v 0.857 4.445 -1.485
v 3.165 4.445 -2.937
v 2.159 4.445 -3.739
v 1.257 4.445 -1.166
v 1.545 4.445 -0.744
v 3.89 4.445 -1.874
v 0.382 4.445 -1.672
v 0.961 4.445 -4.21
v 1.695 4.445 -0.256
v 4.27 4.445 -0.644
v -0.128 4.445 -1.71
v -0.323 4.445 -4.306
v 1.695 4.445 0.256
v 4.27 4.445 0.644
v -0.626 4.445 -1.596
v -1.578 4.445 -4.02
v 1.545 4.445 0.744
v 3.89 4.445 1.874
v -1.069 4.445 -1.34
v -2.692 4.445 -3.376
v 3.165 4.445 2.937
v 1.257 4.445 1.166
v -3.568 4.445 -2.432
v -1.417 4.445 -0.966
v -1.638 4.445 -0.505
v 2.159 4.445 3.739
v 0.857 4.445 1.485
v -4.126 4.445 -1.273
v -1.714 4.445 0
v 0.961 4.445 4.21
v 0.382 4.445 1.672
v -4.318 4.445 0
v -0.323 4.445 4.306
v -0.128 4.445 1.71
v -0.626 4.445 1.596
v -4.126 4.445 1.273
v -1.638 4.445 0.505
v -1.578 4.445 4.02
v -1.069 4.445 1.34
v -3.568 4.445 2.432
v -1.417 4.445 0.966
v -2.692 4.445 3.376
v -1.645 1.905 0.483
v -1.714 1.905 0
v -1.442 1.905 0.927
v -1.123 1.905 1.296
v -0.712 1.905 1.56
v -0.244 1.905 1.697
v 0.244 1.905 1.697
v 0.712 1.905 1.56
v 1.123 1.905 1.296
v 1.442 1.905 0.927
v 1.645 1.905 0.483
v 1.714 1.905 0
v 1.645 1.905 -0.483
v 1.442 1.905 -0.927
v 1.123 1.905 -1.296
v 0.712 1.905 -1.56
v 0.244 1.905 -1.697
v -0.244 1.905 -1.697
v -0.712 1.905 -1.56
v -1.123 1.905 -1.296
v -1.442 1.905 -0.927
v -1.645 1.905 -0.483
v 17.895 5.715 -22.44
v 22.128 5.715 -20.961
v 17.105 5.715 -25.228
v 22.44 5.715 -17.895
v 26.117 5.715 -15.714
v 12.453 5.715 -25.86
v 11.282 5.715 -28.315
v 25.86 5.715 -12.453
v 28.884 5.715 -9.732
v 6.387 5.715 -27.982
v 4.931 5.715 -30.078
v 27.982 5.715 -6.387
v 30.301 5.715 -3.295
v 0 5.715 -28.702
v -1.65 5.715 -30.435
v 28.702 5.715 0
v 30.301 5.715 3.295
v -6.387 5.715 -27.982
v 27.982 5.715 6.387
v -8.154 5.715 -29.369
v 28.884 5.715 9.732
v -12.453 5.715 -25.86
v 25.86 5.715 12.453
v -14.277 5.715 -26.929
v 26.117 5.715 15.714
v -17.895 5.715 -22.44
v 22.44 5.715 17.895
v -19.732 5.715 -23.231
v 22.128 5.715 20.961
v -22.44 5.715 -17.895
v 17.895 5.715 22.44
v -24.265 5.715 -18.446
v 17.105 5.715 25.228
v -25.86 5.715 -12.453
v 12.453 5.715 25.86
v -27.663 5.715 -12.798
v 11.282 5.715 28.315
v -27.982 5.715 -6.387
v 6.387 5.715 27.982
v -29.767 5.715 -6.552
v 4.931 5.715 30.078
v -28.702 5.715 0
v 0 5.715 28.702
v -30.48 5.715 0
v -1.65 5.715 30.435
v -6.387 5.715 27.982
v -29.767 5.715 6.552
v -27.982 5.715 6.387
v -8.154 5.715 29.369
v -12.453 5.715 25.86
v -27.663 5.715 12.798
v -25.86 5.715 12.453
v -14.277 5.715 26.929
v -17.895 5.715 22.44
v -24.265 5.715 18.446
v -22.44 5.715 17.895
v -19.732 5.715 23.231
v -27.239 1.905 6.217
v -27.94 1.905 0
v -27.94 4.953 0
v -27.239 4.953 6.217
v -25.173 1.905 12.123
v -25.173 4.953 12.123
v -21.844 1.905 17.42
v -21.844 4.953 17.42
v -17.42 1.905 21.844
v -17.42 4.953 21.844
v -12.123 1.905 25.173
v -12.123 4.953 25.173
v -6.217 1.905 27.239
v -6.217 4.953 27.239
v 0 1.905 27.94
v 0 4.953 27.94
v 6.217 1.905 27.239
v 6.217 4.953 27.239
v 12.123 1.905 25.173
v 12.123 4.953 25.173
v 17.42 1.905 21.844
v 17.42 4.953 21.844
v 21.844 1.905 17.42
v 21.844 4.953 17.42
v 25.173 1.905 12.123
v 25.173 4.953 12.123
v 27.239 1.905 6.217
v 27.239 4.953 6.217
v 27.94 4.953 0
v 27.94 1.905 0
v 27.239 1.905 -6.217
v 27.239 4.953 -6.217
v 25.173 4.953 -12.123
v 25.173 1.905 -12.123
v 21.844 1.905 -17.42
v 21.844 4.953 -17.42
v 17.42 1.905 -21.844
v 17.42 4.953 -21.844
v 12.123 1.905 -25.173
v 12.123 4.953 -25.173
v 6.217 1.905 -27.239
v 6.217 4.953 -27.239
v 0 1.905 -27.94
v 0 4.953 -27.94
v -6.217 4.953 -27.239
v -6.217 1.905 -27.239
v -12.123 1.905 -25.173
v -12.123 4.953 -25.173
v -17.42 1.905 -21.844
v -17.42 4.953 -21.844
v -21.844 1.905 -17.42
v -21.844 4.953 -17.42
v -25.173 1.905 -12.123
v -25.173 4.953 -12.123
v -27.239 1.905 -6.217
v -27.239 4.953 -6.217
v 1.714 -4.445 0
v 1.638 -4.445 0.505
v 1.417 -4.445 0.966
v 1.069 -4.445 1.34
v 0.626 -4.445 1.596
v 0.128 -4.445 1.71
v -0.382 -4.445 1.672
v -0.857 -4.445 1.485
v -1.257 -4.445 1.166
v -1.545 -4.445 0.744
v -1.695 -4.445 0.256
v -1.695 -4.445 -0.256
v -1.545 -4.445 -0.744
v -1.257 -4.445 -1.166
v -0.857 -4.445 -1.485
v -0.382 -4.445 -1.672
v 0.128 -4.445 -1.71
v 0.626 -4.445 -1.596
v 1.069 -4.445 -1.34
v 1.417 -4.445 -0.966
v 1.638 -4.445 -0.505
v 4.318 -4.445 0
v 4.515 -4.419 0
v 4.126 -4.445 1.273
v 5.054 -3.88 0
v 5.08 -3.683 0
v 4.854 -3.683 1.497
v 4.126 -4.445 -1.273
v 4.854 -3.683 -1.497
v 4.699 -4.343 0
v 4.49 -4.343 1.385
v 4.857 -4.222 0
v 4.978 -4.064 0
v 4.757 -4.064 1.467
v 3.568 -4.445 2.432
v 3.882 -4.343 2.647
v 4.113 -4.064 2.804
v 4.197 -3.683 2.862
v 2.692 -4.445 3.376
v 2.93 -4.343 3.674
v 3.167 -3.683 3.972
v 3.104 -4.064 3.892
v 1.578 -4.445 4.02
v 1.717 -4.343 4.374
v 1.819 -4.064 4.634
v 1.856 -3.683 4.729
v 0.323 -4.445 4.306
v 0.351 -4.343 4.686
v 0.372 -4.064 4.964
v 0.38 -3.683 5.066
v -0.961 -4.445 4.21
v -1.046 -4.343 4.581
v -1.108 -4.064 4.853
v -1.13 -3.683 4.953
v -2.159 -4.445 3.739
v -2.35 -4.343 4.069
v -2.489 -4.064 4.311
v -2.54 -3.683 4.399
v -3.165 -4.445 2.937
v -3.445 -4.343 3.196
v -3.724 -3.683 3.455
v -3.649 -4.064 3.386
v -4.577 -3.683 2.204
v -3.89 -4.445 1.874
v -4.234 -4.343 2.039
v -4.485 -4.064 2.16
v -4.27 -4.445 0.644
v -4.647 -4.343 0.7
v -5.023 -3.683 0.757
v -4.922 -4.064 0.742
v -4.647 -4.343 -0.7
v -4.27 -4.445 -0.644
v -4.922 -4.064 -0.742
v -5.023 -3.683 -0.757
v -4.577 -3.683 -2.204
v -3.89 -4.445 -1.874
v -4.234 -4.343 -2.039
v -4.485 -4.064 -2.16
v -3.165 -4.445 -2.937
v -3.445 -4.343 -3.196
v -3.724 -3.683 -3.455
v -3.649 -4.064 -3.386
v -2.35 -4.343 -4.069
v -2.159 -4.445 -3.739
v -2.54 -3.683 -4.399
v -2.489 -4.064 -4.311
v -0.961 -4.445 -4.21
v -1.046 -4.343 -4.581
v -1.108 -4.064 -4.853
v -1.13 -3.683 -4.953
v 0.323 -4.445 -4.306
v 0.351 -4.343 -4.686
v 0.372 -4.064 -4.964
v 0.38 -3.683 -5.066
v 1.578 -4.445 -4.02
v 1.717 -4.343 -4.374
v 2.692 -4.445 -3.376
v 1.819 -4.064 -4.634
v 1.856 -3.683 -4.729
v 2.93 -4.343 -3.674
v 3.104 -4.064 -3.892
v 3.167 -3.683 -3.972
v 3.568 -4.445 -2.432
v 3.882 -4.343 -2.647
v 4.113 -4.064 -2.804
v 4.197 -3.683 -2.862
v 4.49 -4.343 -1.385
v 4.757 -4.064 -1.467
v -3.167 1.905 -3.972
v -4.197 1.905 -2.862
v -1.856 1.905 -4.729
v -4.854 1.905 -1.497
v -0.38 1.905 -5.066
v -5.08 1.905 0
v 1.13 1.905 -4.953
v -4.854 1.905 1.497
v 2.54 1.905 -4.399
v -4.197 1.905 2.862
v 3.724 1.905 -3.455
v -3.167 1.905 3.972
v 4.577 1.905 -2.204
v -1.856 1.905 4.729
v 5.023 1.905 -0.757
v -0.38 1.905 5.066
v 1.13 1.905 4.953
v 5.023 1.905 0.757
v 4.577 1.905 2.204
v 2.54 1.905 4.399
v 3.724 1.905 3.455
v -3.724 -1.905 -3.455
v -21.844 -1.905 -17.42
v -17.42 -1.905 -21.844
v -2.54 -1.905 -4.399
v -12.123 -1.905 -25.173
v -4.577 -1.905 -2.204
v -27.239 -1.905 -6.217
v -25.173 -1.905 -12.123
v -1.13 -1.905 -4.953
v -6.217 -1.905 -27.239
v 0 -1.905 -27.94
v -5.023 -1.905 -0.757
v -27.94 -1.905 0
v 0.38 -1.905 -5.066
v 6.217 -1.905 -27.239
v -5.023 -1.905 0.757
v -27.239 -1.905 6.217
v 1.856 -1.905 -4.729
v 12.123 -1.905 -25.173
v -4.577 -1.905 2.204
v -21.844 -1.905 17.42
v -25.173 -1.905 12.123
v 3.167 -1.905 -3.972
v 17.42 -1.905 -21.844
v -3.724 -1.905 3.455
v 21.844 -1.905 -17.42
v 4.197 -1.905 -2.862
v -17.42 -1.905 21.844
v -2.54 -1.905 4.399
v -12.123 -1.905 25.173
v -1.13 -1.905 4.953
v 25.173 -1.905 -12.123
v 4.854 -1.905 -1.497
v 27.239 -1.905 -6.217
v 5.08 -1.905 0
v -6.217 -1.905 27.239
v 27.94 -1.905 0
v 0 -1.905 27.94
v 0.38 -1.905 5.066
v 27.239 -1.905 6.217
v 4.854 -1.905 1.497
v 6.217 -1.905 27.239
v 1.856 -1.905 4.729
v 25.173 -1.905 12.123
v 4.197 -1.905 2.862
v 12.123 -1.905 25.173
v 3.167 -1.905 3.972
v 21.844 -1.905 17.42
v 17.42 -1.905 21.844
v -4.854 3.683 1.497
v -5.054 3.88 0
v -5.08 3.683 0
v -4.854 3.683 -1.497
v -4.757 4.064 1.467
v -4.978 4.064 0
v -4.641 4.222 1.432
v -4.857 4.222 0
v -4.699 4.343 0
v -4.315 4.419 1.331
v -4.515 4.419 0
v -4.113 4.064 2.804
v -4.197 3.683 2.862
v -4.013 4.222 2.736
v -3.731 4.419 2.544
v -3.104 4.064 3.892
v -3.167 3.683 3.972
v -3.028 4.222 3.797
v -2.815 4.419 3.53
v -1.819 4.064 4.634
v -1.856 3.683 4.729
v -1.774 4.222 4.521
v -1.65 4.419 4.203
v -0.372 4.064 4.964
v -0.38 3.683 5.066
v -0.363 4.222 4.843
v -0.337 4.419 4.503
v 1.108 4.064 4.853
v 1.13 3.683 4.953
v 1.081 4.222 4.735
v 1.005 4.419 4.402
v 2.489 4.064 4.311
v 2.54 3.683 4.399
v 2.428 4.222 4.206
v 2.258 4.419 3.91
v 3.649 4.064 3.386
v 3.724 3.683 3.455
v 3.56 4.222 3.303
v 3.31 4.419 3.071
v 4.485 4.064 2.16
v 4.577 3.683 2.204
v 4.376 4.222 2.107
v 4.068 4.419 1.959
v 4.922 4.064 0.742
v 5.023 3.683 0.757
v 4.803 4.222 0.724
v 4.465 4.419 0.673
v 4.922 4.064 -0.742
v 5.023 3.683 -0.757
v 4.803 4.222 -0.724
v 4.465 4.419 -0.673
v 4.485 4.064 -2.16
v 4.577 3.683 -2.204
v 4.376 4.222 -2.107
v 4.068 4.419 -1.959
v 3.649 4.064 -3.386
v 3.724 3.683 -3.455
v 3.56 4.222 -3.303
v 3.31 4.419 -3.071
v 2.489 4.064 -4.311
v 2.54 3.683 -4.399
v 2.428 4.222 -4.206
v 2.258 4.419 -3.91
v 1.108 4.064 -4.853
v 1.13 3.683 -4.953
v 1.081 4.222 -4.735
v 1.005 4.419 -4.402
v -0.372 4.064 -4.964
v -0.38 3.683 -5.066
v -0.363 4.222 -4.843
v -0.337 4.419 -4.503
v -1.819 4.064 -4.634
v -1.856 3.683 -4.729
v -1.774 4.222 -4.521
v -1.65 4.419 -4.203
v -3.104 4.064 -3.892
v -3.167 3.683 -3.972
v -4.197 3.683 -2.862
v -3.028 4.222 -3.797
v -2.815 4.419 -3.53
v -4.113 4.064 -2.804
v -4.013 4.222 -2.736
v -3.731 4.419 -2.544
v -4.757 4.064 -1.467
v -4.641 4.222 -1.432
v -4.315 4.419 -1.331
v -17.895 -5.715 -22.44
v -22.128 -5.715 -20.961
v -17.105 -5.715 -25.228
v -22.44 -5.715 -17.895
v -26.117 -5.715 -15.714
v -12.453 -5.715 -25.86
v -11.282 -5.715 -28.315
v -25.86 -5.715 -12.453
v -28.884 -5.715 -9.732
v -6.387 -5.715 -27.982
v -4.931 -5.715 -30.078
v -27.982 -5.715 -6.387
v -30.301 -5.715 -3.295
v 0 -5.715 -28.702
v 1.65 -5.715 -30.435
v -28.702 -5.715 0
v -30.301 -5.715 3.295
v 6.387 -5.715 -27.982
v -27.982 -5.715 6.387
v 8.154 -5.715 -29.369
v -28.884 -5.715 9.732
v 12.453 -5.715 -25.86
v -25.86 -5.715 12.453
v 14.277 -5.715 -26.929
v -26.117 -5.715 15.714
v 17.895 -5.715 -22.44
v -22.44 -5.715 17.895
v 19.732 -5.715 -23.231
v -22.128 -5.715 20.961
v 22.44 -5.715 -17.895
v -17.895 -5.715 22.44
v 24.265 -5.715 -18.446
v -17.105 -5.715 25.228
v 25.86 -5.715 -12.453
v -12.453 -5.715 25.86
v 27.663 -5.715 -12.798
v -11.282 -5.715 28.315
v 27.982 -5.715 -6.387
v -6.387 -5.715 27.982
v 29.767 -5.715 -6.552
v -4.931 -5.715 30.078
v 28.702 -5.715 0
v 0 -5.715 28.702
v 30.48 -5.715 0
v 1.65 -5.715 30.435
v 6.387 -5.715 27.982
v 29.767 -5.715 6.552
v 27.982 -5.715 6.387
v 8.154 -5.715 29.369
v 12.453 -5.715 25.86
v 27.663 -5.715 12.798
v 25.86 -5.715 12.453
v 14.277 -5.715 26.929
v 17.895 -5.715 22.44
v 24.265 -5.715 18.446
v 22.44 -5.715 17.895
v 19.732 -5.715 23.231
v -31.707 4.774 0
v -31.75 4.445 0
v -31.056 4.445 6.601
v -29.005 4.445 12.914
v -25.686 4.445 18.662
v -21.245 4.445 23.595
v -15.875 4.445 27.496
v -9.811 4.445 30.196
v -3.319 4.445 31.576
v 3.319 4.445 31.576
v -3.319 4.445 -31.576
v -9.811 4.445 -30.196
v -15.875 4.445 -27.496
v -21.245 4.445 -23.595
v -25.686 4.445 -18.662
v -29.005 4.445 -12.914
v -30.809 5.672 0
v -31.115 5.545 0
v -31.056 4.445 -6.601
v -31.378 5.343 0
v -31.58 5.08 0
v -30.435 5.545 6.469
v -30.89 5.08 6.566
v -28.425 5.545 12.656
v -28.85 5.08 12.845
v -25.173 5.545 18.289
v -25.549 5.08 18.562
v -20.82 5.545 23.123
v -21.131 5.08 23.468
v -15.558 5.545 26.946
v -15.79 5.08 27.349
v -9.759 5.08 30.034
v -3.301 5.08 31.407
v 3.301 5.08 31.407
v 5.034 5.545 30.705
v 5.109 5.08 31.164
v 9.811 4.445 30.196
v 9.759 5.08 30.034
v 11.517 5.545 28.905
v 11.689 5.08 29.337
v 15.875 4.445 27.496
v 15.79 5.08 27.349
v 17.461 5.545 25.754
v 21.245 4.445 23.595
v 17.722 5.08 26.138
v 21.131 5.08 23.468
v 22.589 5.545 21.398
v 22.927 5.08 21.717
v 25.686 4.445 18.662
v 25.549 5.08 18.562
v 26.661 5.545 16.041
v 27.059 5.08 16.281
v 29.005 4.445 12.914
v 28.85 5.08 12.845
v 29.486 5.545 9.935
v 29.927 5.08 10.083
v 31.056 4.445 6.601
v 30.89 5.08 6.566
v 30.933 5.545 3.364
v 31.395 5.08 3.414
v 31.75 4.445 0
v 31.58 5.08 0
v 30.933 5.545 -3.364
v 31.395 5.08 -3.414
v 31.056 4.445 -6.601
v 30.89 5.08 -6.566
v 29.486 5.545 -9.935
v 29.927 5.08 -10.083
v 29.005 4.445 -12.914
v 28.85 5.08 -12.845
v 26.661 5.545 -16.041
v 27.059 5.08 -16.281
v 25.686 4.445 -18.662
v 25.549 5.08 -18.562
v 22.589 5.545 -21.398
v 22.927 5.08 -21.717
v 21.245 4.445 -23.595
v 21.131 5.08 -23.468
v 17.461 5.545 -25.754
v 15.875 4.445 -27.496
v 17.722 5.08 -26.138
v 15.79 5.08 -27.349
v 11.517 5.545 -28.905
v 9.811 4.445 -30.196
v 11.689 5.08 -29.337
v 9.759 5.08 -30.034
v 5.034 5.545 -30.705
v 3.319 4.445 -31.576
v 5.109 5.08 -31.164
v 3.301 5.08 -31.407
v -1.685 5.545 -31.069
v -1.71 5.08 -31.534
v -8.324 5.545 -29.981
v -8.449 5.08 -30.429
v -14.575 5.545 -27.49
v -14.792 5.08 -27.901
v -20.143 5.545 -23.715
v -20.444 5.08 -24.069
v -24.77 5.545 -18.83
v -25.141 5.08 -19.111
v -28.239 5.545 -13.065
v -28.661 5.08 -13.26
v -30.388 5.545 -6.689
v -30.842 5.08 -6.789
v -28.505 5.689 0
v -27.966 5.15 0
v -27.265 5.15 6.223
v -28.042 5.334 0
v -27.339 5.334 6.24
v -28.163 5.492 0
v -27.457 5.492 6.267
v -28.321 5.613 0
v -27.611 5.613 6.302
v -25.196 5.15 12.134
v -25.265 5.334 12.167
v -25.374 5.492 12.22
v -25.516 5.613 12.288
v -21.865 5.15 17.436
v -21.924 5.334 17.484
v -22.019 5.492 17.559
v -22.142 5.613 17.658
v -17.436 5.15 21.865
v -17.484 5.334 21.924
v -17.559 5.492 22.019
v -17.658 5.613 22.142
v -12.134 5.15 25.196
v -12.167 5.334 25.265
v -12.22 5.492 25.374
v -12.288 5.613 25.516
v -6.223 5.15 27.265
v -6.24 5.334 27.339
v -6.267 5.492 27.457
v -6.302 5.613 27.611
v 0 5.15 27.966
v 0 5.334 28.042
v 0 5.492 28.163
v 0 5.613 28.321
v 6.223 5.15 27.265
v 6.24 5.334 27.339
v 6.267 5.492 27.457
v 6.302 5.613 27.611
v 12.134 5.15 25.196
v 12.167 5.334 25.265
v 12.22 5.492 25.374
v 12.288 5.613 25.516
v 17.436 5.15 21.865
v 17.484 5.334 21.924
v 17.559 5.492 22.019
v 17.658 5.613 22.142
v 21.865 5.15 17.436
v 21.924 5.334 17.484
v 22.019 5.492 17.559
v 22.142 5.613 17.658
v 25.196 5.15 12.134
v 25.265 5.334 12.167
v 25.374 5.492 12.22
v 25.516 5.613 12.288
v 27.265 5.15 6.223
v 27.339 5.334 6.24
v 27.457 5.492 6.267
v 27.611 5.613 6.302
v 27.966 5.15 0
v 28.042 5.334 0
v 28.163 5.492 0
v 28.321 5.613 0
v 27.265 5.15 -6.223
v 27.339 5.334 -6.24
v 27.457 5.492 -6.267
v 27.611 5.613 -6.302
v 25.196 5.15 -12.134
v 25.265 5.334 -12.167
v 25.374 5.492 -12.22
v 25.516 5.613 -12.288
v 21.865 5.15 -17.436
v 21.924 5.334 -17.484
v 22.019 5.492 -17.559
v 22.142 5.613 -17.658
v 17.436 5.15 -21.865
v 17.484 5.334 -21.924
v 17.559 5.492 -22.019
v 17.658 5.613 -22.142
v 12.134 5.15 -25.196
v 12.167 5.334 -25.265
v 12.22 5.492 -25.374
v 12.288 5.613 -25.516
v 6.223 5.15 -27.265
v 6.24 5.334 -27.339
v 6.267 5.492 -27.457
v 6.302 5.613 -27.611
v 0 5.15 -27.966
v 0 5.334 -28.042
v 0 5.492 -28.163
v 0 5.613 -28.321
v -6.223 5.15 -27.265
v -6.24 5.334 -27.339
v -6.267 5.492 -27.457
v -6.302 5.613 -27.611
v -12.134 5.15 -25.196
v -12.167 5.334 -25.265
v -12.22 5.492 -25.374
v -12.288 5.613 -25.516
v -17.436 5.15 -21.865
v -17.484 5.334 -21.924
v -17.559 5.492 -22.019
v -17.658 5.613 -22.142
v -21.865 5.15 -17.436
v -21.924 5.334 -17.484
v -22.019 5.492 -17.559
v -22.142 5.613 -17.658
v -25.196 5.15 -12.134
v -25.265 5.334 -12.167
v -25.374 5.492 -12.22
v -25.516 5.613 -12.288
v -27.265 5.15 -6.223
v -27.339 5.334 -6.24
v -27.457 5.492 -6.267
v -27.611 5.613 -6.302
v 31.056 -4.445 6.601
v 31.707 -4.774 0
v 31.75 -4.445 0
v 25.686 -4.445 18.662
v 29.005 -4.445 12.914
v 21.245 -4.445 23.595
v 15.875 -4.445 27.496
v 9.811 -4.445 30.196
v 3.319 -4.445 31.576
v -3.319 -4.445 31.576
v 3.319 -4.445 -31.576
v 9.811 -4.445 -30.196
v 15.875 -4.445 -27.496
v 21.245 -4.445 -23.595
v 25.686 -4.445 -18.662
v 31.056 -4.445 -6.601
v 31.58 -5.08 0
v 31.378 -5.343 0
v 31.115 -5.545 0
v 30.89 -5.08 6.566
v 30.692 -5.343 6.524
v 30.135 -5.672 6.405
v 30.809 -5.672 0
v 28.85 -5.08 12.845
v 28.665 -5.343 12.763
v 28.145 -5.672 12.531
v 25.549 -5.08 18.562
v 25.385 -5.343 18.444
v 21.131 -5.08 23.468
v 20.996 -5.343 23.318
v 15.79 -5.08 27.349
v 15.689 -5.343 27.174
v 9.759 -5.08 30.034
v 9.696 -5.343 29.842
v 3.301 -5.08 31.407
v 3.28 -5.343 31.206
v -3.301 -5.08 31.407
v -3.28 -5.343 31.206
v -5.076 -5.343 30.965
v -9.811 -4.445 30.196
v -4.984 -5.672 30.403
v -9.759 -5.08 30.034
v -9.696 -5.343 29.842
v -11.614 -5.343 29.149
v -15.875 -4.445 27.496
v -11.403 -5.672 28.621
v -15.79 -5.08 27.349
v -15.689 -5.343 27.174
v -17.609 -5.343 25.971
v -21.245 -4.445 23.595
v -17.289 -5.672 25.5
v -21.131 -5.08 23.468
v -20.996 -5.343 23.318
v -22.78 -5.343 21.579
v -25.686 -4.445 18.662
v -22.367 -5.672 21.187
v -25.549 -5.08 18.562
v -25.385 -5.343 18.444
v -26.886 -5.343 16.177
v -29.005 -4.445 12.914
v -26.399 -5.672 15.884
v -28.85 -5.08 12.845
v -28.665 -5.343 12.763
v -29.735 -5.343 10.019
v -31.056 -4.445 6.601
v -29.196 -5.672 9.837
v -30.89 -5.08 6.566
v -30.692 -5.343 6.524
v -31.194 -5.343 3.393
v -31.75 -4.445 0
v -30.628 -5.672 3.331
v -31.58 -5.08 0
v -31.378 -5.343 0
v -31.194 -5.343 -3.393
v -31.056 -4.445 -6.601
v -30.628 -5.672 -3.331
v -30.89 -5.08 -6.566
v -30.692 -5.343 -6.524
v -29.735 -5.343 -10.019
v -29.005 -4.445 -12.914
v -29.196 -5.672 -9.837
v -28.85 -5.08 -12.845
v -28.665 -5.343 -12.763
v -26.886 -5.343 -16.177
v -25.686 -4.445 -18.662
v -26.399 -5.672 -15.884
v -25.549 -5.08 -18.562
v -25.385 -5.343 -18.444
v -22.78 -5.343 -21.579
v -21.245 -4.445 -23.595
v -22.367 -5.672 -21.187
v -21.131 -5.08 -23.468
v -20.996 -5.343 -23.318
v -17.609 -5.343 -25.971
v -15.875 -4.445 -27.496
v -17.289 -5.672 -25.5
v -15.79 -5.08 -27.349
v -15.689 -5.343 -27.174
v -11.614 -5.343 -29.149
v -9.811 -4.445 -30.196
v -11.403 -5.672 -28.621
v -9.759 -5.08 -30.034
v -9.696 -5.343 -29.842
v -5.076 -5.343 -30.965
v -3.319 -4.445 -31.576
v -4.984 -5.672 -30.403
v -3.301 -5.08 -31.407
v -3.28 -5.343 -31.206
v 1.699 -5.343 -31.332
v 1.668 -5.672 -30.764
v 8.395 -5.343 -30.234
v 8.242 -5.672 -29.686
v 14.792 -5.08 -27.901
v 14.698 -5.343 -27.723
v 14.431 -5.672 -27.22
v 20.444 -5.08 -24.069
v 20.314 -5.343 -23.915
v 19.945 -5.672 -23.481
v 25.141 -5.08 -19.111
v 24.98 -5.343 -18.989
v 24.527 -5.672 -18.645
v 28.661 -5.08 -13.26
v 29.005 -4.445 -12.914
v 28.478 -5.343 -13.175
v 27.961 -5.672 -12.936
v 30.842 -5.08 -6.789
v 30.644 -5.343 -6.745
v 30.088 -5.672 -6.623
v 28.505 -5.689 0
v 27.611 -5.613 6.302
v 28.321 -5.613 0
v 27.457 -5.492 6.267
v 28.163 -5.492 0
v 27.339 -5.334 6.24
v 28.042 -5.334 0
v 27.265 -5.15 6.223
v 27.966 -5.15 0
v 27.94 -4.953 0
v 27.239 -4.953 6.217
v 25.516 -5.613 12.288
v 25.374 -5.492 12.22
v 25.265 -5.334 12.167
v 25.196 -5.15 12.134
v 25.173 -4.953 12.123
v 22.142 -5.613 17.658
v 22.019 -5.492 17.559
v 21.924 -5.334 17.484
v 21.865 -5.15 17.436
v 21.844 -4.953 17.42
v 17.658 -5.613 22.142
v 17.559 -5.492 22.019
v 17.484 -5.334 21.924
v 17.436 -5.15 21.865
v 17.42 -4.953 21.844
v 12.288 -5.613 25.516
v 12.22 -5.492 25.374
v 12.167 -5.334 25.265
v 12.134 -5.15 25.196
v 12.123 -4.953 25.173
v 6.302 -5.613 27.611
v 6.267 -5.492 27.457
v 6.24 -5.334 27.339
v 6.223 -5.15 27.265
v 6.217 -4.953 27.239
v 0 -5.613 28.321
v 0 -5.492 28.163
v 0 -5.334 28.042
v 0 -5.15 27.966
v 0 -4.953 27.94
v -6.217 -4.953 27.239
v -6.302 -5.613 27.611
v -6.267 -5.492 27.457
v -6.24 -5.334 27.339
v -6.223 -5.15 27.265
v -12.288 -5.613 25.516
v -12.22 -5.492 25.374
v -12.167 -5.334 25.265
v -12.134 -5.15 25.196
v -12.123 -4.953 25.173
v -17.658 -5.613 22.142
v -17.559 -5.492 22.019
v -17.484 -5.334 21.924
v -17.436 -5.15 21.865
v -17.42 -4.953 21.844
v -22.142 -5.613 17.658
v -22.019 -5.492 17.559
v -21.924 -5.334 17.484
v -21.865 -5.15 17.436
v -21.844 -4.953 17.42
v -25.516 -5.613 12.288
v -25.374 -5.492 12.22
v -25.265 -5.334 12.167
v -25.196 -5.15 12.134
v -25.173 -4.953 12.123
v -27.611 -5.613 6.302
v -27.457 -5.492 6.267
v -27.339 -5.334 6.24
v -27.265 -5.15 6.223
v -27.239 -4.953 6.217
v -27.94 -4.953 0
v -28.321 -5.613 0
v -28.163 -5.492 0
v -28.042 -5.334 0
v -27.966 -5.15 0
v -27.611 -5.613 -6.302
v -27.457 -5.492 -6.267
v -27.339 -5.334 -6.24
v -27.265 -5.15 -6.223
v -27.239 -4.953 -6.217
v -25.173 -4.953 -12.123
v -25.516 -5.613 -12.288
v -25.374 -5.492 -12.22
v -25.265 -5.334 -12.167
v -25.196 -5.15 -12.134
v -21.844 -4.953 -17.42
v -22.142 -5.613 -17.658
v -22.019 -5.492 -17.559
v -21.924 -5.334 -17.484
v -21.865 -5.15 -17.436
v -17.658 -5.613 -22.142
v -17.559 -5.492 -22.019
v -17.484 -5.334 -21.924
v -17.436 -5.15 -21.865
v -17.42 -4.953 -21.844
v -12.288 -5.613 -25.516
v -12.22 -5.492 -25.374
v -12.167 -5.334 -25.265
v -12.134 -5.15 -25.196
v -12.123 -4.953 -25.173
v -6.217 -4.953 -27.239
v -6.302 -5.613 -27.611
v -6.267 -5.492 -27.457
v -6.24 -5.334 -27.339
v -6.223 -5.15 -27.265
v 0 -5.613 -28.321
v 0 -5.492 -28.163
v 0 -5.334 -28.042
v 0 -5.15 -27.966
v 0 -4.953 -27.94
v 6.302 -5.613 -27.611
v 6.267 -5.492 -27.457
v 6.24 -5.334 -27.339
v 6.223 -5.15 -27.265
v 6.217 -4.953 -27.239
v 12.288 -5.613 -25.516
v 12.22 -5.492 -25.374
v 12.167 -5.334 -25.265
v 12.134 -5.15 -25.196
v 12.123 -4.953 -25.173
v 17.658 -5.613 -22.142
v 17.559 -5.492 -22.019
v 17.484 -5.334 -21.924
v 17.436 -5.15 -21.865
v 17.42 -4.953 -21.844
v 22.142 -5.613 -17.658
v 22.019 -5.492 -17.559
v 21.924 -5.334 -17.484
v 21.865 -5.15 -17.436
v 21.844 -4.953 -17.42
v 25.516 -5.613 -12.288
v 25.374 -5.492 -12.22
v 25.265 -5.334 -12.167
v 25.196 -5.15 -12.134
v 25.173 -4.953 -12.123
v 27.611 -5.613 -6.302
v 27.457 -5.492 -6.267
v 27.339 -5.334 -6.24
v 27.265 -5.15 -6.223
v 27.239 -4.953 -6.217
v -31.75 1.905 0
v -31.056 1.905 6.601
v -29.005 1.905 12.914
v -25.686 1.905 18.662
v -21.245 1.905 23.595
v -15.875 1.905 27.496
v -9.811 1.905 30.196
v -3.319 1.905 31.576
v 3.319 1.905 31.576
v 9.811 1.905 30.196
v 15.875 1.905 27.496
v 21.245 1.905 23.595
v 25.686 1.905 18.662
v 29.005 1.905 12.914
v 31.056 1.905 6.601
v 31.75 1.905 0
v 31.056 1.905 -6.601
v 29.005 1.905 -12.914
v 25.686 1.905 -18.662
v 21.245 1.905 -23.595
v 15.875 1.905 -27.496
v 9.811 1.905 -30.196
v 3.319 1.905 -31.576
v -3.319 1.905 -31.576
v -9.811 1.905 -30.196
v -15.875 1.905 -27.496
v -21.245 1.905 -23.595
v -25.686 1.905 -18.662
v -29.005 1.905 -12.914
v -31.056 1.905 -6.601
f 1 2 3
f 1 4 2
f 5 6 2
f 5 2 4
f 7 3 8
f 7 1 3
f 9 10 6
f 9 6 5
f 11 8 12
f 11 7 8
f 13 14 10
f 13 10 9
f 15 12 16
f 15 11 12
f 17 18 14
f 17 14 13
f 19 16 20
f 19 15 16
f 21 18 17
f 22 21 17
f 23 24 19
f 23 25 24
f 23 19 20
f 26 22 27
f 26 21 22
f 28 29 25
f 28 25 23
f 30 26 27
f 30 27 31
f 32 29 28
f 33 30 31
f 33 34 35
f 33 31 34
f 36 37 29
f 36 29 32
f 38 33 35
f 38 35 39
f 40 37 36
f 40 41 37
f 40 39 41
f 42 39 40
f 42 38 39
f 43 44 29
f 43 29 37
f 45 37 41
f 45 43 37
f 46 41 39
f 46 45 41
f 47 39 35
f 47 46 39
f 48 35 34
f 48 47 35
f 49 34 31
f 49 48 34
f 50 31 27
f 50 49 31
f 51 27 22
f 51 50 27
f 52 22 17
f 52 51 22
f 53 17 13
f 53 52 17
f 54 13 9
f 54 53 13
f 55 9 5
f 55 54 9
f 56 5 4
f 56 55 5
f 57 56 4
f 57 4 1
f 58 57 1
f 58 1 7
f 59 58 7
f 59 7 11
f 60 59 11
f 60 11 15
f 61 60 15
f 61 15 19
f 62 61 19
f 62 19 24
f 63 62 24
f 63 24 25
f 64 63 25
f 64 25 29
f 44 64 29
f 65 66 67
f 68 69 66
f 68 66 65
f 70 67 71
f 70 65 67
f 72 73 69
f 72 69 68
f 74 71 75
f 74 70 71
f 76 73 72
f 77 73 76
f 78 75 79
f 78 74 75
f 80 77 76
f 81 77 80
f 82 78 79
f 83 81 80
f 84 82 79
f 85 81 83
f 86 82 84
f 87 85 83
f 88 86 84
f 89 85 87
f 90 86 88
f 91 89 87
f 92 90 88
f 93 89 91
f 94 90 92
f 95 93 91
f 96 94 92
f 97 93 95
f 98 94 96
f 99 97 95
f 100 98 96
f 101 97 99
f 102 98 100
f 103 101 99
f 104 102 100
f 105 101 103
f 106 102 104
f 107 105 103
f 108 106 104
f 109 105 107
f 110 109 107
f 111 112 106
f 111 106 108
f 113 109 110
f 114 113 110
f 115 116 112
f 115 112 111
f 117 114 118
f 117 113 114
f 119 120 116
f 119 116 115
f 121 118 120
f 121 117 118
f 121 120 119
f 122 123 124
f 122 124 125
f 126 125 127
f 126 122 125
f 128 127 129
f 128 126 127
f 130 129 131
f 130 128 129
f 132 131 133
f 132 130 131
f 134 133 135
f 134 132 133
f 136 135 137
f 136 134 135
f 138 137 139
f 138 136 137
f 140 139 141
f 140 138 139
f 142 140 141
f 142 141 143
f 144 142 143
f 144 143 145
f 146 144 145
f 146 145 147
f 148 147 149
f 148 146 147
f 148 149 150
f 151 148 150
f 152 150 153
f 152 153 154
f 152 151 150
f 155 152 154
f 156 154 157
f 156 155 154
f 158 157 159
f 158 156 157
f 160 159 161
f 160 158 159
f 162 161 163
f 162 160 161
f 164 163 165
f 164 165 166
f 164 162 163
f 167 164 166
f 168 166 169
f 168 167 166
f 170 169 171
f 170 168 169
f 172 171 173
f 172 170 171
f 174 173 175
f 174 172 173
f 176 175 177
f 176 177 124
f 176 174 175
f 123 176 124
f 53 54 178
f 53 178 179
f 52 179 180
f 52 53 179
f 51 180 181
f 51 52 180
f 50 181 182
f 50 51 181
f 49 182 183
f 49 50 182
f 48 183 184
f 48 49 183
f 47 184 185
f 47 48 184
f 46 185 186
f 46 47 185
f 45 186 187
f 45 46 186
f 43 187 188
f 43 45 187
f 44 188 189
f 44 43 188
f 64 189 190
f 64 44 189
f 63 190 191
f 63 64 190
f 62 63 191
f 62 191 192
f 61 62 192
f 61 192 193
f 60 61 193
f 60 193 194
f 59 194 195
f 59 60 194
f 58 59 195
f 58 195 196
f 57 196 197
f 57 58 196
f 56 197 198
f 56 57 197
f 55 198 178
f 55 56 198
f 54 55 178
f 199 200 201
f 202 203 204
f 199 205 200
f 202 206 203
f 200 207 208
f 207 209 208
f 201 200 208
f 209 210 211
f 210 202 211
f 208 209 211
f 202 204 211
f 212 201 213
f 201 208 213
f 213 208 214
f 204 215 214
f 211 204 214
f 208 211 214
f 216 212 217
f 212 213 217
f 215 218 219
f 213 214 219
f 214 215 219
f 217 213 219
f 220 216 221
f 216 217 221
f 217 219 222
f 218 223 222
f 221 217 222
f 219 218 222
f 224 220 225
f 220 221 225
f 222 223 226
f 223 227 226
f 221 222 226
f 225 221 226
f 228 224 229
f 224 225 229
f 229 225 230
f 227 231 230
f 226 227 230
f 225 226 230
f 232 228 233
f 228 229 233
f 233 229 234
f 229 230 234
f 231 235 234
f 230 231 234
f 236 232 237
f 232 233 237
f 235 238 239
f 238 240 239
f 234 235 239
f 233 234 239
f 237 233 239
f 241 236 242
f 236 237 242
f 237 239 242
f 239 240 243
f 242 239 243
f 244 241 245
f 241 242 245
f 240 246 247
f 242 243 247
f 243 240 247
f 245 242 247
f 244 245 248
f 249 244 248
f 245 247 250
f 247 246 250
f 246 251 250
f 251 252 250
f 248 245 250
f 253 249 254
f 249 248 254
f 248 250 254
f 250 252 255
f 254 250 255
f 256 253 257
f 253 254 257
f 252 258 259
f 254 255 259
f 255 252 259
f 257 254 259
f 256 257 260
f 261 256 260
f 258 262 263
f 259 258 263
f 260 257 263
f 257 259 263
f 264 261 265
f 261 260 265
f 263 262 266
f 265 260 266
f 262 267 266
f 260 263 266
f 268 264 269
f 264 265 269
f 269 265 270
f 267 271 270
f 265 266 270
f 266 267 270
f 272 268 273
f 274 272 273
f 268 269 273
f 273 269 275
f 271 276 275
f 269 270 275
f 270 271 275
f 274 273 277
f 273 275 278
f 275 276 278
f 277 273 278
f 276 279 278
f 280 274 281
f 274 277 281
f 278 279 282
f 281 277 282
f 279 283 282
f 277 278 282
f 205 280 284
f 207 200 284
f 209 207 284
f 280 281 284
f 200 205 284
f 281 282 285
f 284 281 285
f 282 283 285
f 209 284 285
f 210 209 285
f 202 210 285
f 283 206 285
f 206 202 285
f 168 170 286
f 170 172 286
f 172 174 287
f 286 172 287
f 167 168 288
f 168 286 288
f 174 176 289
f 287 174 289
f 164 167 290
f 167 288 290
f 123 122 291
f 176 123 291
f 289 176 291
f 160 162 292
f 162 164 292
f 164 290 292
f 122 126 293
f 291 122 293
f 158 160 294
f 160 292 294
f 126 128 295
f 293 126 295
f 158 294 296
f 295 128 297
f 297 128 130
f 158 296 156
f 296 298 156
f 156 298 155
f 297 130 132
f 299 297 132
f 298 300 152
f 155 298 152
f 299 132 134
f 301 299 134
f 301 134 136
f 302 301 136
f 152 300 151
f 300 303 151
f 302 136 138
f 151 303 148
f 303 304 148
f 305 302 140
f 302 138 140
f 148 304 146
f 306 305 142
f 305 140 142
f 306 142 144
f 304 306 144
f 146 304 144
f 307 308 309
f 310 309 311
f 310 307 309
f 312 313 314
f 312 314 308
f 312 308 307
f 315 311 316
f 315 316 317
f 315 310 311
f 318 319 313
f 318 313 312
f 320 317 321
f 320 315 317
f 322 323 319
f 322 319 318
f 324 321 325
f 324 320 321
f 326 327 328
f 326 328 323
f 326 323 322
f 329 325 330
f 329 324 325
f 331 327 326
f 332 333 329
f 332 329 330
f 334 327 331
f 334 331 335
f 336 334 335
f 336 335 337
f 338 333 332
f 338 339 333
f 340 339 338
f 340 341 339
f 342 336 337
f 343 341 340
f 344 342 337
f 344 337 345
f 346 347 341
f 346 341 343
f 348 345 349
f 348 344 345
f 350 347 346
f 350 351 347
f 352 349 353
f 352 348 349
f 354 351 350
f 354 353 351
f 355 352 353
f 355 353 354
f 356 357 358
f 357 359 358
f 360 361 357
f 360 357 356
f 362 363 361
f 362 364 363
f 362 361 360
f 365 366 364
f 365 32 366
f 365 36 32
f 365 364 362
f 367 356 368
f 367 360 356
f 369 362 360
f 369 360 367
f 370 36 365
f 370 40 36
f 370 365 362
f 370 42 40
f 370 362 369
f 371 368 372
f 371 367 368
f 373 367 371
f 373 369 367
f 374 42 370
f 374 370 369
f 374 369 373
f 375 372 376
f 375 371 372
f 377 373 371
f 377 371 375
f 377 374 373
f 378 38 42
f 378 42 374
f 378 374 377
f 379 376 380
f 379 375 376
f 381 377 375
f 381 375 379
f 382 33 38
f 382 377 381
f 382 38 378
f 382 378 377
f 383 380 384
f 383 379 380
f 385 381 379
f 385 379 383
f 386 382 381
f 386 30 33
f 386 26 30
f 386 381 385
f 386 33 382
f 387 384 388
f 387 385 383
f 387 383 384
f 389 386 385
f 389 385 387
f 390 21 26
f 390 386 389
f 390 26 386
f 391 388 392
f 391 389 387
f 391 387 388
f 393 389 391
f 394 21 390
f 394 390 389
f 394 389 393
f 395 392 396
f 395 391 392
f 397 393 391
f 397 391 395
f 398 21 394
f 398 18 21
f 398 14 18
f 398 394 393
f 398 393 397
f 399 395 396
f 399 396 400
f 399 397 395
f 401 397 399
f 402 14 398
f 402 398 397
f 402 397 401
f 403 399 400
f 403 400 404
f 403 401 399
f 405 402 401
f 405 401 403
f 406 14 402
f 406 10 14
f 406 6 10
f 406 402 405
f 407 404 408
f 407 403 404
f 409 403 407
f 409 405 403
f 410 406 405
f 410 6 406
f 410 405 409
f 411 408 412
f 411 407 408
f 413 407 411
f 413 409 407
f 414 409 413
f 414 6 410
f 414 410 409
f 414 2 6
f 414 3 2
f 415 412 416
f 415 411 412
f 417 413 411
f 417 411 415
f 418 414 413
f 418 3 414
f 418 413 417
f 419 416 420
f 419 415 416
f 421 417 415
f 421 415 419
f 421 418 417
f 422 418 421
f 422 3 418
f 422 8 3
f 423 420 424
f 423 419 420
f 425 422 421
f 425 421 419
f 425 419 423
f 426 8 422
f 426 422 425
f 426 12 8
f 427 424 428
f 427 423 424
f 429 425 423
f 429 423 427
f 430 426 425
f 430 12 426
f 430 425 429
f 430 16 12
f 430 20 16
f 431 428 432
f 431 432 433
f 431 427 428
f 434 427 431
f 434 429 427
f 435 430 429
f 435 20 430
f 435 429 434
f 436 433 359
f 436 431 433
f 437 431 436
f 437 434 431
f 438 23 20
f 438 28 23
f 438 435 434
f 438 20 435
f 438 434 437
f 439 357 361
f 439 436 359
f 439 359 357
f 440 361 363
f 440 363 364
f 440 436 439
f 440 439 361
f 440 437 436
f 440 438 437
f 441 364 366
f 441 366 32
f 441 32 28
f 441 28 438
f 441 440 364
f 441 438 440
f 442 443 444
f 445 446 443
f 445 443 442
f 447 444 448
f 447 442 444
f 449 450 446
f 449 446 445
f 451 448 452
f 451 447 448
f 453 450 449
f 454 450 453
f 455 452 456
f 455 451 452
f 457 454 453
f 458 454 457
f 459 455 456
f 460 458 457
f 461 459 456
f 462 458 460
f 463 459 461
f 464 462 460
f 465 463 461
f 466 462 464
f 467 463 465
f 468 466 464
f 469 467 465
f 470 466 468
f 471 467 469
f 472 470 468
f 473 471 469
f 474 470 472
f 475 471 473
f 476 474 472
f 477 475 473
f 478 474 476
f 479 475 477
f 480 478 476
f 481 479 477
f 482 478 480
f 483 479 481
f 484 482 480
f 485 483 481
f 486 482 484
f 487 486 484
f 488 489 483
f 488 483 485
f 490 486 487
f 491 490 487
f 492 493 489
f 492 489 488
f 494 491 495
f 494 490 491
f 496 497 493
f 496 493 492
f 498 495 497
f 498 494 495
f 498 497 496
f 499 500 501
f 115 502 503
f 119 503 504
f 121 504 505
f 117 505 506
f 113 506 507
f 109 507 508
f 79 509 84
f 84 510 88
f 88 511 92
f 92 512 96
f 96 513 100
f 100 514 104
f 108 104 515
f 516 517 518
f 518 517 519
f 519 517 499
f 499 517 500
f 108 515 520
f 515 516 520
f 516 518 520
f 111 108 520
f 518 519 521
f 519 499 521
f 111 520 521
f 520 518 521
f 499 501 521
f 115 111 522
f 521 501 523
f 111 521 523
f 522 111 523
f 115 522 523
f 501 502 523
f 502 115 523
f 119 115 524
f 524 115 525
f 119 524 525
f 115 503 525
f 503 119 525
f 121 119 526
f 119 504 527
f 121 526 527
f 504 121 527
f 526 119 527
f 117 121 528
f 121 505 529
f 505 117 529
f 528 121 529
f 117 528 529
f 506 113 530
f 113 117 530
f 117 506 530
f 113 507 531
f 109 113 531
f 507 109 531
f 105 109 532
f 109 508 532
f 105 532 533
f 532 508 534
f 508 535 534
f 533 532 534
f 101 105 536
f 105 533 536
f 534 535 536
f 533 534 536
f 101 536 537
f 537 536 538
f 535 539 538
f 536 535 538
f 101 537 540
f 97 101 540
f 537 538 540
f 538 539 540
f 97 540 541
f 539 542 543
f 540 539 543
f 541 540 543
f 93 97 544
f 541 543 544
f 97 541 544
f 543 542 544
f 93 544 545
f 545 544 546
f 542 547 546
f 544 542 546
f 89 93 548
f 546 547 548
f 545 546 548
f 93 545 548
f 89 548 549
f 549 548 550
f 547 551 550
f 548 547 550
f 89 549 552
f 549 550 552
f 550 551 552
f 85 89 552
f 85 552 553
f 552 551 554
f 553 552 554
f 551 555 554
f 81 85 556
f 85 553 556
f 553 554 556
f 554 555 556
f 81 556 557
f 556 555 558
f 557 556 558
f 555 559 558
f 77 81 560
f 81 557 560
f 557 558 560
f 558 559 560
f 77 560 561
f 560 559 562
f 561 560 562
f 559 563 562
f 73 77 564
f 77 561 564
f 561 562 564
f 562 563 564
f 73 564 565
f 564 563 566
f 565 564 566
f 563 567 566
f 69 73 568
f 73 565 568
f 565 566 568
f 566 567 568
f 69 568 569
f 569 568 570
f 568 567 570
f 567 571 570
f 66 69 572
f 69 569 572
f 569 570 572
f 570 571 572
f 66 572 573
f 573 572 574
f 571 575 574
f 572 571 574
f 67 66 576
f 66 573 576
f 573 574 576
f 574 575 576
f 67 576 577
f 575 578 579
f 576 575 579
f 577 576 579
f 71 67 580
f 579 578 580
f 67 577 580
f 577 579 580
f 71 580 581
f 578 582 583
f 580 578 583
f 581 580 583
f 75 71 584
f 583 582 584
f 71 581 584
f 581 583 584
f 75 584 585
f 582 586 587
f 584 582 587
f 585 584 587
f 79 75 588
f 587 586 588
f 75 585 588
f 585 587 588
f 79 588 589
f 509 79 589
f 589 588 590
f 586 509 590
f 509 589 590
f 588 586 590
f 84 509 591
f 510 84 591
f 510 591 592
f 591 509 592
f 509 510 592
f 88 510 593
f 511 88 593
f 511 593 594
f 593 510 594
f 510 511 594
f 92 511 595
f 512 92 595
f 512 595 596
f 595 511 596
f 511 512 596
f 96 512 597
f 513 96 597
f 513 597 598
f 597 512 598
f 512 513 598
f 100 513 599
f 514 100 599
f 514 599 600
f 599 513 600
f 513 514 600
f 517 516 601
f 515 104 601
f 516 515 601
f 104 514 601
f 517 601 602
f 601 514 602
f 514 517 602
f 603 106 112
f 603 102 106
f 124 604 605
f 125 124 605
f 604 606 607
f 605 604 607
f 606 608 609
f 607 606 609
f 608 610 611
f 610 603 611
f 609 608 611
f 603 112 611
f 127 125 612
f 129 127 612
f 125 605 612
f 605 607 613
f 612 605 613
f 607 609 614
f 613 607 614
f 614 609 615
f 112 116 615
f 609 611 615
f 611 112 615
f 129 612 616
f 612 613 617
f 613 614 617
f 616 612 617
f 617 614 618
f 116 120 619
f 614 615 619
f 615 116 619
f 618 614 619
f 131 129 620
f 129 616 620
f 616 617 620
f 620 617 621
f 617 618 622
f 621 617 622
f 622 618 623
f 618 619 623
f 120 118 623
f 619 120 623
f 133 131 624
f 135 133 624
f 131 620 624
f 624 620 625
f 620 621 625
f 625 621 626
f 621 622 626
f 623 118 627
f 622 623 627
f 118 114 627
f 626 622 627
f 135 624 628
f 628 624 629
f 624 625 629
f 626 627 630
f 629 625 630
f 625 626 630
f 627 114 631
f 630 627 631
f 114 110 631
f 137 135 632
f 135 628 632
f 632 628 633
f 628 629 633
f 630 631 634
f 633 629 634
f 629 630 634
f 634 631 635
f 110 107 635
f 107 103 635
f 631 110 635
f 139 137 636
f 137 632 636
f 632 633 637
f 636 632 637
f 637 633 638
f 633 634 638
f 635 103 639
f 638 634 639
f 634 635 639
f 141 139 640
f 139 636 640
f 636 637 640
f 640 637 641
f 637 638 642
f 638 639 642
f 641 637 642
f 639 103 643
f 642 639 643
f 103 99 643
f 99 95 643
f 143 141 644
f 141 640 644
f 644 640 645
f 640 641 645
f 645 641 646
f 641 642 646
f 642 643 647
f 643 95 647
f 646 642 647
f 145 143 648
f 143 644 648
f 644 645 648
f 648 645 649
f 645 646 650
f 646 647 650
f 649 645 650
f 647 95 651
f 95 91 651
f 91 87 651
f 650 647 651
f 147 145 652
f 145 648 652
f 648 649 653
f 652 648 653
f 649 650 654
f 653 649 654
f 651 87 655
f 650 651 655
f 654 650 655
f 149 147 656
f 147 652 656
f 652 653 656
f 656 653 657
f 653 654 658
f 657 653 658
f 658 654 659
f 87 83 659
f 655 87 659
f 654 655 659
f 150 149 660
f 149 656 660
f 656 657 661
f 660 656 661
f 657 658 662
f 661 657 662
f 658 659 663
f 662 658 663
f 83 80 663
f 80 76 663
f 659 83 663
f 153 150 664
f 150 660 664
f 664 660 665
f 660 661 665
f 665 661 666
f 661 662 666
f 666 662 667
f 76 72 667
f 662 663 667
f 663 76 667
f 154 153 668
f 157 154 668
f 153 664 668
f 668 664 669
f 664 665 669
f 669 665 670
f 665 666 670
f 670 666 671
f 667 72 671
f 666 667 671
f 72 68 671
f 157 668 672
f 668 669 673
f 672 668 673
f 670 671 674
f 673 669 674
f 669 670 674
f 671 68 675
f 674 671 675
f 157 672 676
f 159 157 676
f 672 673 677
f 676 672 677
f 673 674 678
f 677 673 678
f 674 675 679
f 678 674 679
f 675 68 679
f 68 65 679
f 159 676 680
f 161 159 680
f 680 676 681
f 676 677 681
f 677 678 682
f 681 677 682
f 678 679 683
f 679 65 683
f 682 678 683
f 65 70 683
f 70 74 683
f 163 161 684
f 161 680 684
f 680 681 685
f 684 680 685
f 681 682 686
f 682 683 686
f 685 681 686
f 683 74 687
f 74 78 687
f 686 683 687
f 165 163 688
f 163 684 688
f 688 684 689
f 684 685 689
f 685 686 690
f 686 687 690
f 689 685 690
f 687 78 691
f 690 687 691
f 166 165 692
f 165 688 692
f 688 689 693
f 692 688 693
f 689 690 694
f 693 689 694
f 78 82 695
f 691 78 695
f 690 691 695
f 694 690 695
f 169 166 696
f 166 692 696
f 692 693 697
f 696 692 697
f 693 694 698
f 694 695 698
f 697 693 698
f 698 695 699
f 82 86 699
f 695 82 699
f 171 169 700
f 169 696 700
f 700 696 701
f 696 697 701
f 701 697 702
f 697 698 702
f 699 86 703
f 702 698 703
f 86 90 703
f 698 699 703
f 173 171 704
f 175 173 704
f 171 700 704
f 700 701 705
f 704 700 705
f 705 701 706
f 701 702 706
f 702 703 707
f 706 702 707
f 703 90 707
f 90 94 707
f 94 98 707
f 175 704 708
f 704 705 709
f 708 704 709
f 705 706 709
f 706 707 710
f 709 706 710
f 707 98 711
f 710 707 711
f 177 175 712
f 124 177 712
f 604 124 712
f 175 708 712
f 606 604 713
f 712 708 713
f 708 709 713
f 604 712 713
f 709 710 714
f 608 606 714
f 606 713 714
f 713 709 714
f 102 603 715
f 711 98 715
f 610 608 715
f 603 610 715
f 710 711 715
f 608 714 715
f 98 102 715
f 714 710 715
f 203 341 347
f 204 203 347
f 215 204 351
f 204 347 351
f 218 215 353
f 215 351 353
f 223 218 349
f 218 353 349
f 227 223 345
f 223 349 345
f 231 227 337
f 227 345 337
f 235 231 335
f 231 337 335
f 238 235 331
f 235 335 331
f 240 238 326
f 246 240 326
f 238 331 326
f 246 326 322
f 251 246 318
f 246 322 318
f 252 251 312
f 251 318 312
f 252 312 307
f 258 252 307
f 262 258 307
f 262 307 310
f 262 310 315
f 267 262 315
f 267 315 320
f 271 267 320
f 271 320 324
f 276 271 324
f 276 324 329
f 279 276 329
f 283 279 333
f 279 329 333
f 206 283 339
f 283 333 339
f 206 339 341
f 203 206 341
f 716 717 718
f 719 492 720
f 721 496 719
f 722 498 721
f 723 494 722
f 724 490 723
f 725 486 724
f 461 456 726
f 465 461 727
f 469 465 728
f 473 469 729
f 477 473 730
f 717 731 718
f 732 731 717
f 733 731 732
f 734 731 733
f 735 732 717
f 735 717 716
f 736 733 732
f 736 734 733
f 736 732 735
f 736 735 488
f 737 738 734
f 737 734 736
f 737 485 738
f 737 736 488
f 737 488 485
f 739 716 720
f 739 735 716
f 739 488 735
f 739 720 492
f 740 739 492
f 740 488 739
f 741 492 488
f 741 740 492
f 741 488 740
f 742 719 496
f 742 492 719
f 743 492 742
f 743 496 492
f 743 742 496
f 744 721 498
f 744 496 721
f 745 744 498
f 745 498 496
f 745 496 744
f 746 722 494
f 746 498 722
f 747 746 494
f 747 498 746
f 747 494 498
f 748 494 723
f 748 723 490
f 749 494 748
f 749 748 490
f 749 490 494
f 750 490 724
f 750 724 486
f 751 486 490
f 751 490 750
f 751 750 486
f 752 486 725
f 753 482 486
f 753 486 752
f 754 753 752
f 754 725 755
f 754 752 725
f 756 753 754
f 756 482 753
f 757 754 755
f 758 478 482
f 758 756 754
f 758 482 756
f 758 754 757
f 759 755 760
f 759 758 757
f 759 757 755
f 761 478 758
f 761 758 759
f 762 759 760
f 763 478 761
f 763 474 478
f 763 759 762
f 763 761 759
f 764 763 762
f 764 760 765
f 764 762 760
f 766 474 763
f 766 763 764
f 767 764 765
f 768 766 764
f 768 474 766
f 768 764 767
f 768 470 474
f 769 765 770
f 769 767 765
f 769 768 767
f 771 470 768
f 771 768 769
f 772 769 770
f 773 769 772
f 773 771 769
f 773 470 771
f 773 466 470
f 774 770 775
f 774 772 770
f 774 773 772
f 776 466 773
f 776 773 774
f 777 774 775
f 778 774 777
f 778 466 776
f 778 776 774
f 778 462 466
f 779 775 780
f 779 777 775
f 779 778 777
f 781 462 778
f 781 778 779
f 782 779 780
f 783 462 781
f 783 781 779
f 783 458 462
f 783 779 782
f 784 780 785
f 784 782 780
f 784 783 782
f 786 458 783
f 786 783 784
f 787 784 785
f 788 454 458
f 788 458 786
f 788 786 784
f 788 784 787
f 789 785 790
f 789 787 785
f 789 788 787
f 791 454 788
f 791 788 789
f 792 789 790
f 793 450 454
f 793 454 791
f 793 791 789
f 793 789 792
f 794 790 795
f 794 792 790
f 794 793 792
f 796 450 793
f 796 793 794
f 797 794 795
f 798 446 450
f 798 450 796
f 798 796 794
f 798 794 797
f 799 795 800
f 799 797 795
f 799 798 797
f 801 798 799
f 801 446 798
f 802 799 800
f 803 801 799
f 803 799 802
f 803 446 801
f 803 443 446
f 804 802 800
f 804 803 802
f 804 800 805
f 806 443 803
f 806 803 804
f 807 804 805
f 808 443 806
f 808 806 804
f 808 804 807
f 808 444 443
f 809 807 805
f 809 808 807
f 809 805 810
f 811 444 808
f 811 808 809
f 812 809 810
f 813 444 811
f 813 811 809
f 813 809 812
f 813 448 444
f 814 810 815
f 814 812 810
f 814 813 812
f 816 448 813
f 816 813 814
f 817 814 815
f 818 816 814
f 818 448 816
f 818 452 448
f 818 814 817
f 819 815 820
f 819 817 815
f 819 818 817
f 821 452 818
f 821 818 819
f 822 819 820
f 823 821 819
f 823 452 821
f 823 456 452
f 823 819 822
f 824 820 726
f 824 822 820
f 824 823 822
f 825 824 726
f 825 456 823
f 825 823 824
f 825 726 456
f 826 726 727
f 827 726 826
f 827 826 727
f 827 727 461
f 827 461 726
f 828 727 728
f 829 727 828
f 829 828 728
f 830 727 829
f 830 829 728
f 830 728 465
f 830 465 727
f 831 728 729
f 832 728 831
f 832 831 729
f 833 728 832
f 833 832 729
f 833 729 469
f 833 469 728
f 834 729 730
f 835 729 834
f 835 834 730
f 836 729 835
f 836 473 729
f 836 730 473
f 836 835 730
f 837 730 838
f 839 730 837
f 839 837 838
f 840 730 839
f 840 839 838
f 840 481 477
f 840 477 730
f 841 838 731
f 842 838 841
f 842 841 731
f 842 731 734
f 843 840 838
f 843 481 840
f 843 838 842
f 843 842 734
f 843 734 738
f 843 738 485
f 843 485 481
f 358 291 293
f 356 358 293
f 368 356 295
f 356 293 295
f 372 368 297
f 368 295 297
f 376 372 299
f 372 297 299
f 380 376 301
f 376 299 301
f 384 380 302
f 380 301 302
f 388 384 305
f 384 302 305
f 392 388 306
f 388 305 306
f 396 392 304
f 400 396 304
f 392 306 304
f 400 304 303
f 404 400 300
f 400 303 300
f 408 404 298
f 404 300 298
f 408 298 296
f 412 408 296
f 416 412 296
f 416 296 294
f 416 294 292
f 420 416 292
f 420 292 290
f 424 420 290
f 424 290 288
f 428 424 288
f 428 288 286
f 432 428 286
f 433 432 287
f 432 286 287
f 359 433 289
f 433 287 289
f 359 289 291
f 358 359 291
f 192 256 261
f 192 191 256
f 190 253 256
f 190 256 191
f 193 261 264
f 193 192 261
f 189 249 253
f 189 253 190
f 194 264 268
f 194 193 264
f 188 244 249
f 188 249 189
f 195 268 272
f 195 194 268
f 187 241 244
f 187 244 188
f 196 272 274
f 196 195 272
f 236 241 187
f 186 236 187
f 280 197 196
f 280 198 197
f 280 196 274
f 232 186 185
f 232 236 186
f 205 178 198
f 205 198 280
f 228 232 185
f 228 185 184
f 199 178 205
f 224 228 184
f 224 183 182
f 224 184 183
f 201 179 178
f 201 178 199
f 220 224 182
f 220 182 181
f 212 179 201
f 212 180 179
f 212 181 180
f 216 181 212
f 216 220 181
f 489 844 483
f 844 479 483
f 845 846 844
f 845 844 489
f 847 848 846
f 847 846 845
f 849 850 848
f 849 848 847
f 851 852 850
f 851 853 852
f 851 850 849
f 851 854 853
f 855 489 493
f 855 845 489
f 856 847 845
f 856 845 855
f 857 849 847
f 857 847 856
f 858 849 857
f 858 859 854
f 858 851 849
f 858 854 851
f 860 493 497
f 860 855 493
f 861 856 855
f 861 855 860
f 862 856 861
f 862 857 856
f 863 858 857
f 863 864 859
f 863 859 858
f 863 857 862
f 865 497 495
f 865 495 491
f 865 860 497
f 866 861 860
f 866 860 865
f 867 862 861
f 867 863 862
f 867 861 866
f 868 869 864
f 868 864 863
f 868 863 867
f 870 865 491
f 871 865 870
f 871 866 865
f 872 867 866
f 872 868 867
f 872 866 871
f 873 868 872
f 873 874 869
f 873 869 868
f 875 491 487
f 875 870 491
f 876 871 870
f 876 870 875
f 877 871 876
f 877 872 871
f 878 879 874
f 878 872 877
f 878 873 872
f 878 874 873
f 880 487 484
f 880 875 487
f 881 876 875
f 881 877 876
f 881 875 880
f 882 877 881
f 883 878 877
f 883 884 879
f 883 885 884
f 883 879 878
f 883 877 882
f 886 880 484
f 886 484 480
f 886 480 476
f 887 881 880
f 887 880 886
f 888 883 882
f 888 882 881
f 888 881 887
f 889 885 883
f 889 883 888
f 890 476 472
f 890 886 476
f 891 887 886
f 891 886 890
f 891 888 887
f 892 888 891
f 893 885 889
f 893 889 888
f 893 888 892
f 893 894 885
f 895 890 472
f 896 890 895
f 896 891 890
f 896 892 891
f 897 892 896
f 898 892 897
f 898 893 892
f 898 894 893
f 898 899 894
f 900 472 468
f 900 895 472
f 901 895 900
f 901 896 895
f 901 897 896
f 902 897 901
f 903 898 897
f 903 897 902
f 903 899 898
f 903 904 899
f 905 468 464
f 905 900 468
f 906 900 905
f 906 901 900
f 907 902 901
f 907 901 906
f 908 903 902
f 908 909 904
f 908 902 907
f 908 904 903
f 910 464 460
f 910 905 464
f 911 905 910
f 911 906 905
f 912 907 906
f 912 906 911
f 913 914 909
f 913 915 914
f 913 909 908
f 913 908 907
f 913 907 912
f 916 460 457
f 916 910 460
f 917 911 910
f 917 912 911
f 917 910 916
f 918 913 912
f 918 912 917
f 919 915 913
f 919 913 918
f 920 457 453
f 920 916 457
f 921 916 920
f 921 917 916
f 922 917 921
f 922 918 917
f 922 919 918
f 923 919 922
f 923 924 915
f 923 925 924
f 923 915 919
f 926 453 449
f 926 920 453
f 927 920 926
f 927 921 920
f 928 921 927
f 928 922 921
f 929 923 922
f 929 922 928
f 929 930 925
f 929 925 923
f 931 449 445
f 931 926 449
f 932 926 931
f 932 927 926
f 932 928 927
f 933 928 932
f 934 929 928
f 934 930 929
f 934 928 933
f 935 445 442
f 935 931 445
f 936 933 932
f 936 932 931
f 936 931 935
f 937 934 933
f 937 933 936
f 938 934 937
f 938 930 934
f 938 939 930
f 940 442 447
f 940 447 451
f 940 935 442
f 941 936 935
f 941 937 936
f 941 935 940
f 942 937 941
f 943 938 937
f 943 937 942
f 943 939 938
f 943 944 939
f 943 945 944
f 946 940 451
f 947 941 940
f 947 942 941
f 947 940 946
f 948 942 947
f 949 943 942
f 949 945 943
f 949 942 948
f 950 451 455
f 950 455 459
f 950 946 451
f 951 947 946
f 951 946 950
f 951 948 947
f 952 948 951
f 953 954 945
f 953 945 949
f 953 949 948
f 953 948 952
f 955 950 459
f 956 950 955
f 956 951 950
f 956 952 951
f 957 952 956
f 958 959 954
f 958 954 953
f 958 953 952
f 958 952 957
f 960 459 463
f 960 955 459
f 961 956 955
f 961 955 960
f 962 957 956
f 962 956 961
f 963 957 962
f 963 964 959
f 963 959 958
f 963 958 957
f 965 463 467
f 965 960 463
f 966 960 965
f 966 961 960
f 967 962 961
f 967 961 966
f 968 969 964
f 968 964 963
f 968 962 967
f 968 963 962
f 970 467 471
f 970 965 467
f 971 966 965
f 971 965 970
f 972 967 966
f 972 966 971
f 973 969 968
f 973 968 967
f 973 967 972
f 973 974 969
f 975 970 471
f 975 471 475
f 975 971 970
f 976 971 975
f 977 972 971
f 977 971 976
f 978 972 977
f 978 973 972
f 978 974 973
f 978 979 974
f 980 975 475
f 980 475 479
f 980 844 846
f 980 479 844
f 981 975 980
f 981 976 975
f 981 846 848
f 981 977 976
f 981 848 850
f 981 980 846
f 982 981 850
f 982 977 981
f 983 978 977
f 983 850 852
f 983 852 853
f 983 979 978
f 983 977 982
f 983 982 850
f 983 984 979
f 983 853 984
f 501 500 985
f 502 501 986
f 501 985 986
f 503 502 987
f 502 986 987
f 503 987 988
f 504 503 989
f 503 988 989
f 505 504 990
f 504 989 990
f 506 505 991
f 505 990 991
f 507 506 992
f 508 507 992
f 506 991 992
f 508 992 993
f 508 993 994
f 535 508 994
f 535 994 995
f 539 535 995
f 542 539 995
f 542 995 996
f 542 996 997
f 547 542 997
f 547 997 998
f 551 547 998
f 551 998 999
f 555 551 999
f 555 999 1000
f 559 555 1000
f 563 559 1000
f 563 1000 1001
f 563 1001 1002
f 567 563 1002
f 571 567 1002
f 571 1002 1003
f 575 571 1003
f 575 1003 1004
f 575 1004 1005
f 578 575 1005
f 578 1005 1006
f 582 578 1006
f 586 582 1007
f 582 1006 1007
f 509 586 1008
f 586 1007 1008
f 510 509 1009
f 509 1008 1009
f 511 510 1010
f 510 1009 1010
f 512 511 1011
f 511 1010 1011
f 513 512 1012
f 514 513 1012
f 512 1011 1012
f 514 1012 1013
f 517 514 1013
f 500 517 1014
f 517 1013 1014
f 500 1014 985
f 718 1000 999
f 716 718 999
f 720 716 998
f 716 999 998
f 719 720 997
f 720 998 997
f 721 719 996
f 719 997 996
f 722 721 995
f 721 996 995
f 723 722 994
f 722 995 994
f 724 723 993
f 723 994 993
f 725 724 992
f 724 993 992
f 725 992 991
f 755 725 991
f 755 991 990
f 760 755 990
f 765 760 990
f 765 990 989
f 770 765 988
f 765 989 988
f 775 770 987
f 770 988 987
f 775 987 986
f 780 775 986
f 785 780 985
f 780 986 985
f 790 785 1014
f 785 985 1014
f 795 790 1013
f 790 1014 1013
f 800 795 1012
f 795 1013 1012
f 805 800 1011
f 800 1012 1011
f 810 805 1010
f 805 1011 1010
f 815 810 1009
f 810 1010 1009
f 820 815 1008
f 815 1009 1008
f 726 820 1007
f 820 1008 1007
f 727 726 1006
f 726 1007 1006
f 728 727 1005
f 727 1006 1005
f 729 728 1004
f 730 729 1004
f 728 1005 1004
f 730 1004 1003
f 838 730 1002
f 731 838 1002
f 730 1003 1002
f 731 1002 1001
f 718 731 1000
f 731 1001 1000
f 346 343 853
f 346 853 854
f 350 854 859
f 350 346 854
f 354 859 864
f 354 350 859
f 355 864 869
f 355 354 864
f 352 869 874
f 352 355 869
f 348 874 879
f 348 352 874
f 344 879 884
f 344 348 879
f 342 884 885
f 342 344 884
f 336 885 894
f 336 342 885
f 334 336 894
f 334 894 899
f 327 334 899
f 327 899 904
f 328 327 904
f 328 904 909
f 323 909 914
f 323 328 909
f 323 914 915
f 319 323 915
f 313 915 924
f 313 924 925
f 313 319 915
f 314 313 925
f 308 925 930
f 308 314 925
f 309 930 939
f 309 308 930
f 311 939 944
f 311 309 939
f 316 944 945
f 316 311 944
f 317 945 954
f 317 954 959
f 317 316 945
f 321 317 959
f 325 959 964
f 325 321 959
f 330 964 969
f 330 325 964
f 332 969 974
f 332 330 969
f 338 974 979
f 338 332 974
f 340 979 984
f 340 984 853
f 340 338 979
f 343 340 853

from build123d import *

# Parameters (mm, degrees)
F0_R     = 31.75
F0_R_2   = 25.4
F0_R_3   = 1.7145
F1_DEPTH = 1.905
F2_R     = 31.75
F2_R_2   = 27.94
F3_DEPTH = 3.81
F4_R     = 31.75
F4_R_2   = 27.94
F5_DEPTH = 3.81
F6_R     = 5.08
F6_R_2   = 1.7145
F7_DEPTH = 2.54
F8_R     = 5.08
F8_R_2   = 1.7145
F9_DEPTH = 2.54
F10_R    = 0.762
F11_R    = 1.27


with BuildPart() as f1:
    # F0 (on Front) → F1 (new body, symmetric)
    with BuildSketch(Plane.XZ):
        Circle(F0_R)
        Circle(F0_R_2, mode=Mode.SUBTRACT)
        Circle(F0_R_2)
        Circle(F0_R_3, mode=Mode.SUBTRACT)
    extrude(amount=F1_DEPTH, both=True)

    # F2 (on face) → F3 (join)
    with BuildSketch(Plane.XZ.offset(1.905)):
        Circle(F2_R)
        Circle(F2_R_2, mode=Mode.SUBTRACT)
    extrude(amount=F3_DEPTH)

    # F4 (on face) → F5 (join)
    with BuildSketch(Plane(origin=(0, 1.905, 0), x_dir=(-1, 0, 0), z_dir=(0, 1, 0))):
        Circle(F4_R)
        Circle(F4_R_2, mode=Mode.SUBTRACT)
    extrude(amount=F5_DEPTH)

    # F6 (on face) → F7 (join)
    with BuildSketch(Plane.XZ.offset(1.905)):
        Circle(F6_R)
        Circle(F6_R_2, mode=Mode.SUBTRACT)
    extrude(amount=F7_DEPTH)

    # F8 (on face) → F9 (join)
    with BuildSketch(Plane(origin=(0, 1.905, 0), x_dir=(-1, 0, 0), z_dir=(0, 1, 0))):
        Circle(F8_R)
        Circle(F8_R_2, mode=Mode.SUBTRACT)
    extrude(amount=F9_DEPTH)

    # F10
    f10_edges = [f1.edges().sort_by_distance(p)[0] for p in [
        (27.94, 5.715, 0),
        (-27.94, -5.715, 0),
        (5.08, 4.445, 0),
        (-5.08, -4.445, 0),
    ]]
    fillet(f10_edges, radius=F10_R)

    # F11
    f11_edges = [f1.edges().sort_by_distance(p)[0] for p in [
        (-31.75, -5.715, 0),
        (31.75, 5.715, 0),
    ]]
    fillet(f11_edges, radius=F11_R)


solid = f1.part
